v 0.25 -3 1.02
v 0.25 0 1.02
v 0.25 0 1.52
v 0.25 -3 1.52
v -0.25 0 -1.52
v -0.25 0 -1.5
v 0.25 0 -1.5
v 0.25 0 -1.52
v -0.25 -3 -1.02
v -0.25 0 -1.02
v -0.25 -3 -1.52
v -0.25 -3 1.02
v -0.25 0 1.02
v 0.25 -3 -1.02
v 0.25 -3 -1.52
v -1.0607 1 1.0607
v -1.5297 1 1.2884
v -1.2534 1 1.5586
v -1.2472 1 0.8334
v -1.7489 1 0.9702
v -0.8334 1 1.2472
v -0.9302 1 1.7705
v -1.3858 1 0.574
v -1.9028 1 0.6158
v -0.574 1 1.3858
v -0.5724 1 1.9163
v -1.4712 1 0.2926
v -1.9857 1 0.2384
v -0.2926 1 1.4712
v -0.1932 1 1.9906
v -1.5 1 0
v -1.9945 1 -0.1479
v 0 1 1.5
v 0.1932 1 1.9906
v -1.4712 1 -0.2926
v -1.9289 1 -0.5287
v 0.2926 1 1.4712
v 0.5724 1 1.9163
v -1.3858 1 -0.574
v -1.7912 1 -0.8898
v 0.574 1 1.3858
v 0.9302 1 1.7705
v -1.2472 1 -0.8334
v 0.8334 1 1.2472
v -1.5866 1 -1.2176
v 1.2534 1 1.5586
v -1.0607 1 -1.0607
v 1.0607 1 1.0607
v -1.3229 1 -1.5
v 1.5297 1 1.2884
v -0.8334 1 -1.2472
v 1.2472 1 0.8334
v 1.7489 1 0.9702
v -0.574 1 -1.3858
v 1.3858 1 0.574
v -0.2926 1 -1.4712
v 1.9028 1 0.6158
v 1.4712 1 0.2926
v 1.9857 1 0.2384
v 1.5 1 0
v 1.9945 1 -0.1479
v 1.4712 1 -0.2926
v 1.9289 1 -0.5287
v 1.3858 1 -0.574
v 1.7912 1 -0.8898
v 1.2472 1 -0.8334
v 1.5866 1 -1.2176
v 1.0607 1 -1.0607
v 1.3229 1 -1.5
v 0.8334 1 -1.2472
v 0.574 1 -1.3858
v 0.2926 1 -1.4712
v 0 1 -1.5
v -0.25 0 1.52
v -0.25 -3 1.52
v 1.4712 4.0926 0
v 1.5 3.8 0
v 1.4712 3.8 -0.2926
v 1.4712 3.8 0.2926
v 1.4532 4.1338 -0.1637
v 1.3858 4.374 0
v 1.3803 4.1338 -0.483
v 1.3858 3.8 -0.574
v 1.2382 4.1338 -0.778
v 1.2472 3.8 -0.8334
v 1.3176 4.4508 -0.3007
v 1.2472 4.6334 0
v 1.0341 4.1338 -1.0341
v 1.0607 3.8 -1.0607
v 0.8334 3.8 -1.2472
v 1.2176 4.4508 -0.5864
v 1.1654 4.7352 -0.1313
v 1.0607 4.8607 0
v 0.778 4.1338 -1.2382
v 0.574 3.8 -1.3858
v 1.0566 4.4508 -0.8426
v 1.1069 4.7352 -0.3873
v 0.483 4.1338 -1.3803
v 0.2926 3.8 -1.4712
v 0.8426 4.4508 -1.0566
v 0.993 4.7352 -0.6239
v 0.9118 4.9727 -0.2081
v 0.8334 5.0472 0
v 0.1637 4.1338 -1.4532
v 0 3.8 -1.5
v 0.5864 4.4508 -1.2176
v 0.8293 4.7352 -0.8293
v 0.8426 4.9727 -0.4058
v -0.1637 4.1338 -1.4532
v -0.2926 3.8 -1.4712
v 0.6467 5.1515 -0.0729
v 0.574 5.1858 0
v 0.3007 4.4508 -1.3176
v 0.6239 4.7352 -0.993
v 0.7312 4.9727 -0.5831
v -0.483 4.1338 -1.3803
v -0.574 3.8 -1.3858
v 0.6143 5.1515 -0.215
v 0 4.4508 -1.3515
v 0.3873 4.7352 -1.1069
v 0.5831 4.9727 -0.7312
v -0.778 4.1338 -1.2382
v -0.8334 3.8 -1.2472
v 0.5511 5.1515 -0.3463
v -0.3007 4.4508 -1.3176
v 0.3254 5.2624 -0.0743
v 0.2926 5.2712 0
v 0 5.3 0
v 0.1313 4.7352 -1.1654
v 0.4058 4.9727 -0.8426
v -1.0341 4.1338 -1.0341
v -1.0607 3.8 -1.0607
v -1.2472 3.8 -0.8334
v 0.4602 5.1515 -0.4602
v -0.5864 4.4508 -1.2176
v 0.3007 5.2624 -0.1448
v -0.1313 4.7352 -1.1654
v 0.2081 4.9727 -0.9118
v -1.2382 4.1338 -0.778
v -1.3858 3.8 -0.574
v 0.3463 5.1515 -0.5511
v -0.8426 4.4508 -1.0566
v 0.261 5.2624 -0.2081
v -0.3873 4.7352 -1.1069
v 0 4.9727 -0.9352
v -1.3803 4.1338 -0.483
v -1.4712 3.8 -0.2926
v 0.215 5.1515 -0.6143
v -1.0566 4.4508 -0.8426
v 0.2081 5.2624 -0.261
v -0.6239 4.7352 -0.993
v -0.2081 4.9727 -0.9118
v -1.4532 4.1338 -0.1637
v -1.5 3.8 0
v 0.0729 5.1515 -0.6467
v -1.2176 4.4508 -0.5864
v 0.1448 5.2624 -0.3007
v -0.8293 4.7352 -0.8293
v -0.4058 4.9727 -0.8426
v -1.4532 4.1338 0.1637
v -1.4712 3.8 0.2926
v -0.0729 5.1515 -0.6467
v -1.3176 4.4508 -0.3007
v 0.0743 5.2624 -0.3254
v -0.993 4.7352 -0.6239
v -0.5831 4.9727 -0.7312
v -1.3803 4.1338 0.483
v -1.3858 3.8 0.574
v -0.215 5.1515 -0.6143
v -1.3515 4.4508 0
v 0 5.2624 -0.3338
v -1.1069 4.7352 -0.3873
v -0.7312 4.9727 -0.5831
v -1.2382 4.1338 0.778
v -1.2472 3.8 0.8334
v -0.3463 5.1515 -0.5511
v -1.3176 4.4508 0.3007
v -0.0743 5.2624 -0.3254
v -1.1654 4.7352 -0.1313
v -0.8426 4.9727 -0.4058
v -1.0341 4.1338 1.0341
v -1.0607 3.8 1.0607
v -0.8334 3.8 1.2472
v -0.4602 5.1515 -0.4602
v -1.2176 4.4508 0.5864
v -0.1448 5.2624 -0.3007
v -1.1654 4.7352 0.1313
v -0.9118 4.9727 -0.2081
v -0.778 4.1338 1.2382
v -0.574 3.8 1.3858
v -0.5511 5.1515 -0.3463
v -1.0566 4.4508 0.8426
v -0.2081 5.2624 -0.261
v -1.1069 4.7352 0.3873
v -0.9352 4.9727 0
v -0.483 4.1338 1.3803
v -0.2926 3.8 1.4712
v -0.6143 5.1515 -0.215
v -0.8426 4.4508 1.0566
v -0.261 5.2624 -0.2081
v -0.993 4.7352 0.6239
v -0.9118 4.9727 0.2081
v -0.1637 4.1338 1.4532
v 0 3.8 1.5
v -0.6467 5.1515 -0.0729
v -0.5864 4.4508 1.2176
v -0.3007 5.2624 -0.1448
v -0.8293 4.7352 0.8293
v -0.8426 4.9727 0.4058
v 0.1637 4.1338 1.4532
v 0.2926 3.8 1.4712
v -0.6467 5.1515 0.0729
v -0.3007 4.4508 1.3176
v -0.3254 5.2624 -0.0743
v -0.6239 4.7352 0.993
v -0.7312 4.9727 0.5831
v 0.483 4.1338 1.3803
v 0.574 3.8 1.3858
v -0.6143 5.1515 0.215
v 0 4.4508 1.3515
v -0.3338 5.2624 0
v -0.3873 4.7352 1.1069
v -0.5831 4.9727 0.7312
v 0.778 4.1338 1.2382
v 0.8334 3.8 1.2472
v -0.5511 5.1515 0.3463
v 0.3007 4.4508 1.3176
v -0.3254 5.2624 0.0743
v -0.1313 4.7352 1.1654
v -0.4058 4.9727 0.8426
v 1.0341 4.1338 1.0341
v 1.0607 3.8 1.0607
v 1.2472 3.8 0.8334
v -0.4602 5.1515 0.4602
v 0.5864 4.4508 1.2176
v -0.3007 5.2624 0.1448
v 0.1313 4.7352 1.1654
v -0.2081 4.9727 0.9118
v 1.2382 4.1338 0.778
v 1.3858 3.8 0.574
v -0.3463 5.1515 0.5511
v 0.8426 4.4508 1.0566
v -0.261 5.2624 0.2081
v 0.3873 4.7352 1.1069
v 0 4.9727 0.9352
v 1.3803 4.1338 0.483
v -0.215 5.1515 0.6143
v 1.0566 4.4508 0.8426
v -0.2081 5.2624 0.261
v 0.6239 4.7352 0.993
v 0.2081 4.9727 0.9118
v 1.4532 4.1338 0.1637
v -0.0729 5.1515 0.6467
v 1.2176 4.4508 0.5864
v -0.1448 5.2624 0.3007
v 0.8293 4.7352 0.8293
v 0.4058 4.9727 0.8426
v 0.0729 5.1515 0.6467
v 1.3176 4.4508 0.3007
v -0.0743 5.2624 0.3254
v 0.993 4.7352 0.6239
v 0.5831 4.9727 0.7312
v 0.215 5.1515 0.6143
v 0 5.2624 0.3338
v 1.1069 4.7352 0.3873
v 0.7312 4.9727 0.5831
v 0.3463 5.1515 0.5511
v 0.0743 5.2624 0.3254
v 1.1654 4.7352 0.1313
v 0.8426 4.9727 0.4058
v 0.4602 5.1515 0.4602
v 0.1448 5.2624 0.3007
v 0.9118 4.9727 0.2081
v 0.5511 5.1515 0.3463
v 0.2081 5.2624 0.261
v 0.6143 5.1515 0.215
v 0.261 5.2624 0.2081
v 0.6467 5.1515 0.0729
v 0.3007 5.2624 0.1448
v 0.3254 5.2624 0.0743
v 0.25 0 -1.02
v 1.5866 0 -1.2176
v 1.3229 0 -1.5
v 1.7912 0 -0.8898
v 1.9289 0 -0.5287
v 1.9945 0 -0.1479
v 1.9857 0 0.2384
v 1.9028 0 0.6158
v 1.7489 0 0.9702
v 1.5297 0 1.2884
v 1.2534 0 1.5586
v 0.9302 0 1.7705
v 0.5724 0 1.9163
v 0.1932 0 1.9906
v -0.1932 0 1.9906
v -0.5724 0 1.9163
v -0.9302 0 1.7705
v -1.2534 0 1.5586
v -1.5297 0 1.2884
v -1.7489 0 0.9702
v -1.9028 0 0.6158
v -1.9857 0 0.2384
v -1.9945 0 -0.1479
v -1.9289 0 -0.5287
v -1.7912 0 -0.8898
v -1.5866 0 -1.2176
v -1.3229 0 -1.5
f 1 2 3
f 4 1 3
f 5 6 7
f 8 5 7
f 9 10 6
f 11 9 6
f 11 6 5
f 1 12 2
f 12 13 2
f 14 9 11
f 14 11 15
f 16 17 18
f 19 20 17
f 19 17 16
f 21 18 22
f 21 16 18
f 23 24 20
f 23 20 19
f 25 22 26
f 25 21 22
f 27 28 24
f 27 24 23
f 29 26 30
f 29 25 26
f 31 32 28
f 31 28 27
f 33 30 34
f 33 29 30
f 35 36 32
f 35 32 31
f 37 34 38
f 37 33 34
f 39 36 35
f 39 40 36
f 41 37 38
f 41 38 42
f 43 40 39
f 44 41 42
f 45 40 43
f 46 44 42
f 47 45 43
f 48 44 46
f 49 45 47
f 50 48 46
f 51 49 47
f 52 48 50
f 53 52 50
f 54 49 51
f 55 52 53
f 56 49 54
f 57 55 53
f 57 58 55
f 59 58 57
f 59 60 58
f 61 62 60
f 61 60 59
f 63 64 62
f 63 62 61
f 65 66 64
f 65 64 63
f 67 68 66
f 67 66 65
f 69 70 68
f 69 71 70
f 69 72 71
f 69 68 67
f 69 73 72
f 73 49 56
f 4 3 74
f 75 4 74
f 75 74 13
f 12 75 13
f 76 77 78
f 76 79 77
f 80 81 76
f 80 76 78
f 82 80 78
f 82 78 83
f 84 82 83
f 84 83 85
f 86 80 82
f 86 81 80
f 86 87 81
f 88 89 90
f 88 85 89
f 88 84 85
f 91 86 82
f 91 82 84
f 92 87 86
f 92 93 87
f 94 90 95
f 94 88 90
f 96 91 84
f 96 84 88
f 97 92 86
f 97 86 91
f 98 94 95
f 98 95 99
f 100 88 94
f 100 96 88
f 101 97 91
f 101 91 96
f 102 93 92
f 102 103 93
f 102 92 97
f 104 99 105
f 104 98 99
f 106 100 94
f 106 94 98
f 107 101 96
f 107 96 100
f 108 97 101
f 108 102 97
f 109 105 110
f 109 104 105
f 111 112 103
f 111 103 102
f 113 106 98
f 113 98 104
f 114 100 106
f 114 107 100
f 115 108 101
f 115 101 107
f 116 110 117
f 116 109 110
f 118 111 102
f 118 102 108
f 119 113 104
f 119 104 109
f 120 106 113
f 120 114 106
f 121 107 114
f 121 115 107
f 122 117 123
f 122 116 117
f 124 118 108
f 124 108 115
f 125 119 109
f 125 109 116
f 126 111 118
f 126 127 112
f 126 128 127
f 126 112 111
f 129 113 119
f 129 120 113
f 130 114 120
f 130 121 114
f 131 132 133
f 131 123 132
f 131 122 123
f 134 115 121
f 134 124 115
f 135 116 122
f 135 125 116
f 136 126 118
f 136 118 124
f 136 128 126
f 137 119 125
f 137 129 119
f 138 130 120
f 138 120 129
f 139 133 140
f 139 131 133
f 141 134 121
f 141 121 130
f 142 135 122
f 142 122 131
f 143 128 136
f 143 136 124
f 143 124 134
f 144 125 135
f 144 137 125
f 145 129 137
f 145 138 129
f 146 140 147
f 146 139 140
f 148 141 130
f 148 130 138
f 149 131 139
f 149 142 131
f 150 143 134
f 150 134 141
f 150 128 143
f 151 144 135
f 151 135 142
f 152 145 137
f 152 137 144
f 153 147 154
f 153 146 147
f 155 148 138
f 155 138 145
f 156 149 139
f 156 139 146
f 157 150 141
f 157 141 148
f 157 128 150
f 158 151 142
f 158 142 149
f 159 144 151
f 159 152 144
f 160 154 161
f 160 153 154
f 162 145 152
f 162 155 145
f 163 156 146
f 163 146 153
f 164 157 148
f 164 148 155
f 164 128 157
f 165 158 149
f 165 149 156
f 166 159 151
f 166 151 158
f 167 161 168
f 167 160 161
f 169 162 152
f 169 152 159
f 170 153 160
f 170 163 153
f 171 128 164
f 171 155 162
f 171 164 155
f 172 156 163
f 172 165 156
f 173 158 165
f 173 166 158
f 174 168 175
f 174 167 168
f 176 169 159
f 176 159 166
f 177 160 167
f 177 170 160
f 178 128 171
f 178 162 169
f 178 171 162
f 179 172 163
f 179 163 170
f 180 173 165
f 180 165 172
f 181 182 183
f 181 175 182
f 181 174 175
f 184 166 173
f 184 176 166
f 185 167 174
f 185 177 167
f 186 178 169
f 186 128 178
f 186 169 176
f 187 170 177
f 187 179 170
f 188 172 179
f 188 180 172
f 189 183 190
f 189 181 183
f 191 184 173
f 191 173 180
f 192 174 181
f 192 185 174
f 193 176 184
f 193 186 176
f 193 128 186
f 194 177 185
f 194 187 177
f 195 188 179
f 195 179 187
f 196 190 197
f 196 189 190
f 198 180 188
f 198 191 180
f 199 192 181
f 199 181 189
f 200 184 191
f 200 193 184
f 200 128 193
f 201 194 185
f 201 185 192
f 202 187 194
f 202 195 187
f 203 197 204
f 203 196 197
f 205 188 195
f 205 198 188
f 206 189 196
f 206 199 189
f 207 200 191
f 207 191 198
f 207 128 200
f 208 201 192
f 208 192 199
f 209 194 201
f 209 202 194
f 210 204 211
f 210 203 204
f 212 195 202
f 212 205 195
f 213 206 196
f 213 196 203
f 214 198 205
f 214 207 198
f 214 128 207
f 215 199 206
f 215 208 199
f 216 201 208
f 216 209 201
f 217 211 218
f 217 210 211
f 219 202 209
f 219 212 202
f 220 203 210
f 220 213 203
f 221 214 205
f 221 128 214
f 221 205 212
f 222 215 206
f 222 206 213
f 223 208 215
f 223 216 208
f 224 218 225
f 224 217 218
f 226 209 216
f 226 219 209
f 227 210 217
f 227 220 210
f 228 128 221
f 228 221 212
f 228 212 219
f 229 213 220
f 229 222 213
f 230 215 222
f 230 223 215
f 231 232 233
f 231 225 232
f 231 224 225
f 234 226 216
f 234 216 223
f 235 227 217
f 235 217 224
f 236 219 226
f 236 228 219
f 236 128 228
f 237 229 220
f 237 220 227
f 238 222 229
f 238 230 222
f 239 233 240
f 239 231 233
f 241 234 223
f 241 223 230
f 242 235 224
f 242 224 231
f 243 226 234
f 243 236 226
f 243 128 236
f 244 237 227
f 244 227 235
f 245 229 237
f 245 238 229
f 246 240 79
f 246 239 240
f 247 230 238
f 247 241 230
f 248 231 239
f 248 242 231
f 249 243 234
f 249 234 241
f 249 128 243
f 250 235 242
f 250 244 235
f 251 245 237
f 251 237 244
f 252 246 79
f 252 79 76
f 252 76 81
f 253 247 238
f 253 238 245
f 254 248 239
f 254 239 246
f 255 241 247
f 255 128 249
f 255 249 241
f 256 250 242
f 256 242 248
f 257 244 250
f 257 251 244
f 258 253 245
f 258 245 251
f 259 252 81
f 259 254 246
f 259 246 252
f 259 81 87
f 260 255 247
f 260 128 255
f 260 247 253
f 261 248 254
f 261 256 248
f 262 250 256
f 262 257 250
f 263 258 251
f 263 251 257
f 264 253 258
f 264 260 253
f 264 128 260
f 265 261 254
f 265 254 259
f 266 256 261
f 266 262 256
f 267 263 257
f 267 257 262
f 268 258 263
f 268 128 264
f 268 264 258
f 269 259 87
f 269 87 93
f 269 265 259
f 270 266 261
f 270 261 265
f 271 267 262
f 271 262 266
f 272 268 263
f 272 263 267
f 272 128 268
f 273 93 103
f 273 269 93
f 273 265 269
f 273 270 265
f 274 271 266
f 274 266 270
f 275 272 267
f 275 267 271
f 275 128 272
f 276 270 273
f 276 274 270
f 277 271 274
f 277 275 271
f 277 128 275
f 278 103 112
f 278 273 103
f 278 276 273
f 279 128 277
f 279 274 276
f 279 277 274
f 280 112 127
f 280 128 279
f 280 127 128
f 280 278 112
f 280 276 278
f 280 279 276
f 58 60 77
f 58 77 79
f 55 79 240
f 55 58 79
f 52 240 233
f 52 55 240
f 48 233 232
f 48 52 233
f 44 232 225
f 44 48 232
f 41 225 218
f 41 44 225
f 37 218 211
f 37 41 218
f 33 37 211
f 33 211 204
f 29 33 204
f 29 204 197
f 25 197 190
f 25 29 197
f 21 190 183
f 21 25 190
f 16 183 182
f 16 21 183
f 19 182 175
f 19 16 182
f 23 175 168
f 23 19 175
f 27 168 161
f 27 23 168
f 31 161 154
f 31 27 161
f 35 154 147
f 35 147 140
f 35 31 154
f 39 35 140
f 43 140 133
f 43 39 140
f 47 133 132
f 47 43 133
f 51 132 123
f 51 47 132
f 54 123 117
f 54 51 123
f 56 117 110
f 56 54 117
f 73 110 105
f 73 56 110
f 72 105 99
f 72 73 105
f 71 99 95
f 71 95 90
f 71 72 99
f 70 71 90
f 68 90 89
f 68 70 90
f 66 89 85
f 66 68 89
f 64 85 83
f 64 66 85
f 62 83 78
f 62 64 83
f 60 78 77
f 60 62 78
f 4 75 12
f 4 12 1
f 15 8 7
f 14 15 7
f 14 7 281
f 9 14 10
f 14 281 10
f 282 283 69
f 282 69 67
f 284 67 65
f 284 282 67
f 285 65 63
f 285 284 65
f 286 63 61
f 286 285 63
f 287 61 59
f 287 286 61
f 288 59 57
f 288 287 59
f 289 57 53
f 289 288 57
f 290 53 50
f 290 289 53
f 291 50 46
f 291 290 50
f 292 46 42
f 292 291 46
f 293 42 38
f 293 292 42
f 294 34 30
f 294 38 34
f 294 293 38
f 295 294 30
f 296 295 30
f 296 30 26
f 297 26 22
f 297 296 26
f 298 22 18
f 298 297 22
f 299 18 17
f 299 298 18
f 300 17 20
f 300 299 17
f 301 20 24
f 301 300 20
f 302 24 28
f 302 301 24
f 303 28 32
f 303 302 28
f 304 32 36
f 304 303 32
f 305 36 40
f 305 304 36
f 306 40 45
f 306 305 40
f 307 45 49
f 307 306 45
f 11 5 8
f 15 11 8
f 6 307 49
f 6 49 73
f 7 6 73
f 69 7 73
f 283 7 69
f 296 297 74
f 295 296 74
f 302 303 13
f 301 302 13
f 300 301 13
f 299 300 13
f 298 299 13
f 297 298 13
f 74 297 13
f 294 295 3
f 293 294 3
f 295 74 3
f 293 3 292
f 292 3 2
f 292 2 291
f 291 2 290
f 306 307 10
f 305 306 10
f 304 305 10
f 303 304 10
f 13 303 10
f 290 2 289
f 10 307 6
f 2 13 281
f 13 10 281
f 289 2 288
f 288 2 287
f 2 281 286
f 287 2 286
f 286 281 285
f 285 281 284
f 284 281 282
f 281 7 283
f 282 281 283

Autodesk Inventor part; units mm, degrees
ref_plane "YZ Plane" through (0, 0, 0) normal (1, 0, 0) x (0, 1, 0)
ref_plane "XZ Plane" through (0, 0, 0) normal (0, 1, 0) x (-1, 0, 0)
ref_plane "XY Plane" through (0, 0, 0) normal (0, 0, 1) x (1, 0, 0)
sketch "Sketch1" plane through (0, 0, 0) normal (0, 0, 1) x (1, 0, 0)
  arc A0 (1.5, 3.8) -> (0, 5.3) centre (0, 3.8) ccw
  line L0 (1.5, 3.8) -> (1.5, 1)
  line L1 (1.5, 1) -> (2, 1)
  line L2 (2, 1) -> (2, 0)
  line L3 (2, 0) -> (0, 0)
  line L4 (0, 0) -> (0, 5.3)
  point P0 (0, 0)
  dimension "d0" = 3
  dimension "d1" = 2
  dimension "d2" = 1
  dimension "d3" = 5.3
  dimension "d4" = 0
  dimension "d5" = 0
  dimension "d6" = 0
revolve "Revolution1" add sketch "Sketch1" angle 360 about axis through (0, 0, 0) along (0, 1, 0)
sketch "Sketch2" plane through (0, 0, 0) normal (0, 1, 0) x (-1, 0, 0)
  line L0 (-2.5, -4.5) -> (2.5, -4.5)
  line L1 (2.5, -4.5) -> (2.5, -1.5)
  line L2 (2.5, -1.5) -> (-2.5, -1.5)
  line L3 (-2.5, -1.5) -> (-2.5, -4.5)
  line L4 (-2.5, -4.5) -> (2.5, -1.5) construction
  line L5 (2.5, -4.5) -> (-2.5, -1.5) construction
  point P0 (0, 0)
  point P1 (0, -3)
  dimension "d8" = 1.5
  dimension "d9" = 5
  dimension "d10" = 3
  dimension "d12" = 2.5
extrude "Extrusion1" cut sketch "Sketch2" along normal blind 10
sketch "Sketch3" plane through (0, 0, 0) normal (0, -1, 0) x (1, 0, 0)
  arc A0 (1.3229, -1.5) -> (-1.3229, -1.5) centre (0, 0) ccw projected
  line L0 (-0.25, -1.52) -> (0.25, -1.52)
  line L1 (0.25, -1.52) -> (0.25, -1.02)
  line L2 (0.25, -1.02) -> (-0.25, -1.02)
  line L3 (-0.25, -1.02) -> (-0.25, -1.52)
  line L4 (-0.25, -1.52) -> (0.25, -1.02) construction
  line L5 (0.25, -1.52) -> (-0.25, -1.02) construction
  line L6 (-0.25, 1.02) -> (0.25, 1.02)
  line L7 (0.25, 1.02) -> (0.25, 1.52)
  line L8 (0.25, 1.52) -> (-0.25, 1.52)
  line L9 (-0.25, 1.52) -> (-0.25, 1.02)
  line L10 (-0.25, 1.02) -> (0.25, 1.52) construction
  line L11 (0.25, 1.02) -> (-0.25, 1.52) construction
  point P0 (0, -1.27)
  point P1 (0, 1.27)
  dimension "d15" = 0.5
  dimension "d16" = 0.5
  dimension "d17" = 0.5
  dimension "d18" = 0.5
  dimension "d19" = 2.54
  dimension "d20" = 1.27
extrude "Extrusion2" add sketch "Sketch3" along normal blind 3
equation "\"d12\" = 0.5 * d9"
equation "\"d20\" = 0.5 * d19"
properties part number "LED3mm"
